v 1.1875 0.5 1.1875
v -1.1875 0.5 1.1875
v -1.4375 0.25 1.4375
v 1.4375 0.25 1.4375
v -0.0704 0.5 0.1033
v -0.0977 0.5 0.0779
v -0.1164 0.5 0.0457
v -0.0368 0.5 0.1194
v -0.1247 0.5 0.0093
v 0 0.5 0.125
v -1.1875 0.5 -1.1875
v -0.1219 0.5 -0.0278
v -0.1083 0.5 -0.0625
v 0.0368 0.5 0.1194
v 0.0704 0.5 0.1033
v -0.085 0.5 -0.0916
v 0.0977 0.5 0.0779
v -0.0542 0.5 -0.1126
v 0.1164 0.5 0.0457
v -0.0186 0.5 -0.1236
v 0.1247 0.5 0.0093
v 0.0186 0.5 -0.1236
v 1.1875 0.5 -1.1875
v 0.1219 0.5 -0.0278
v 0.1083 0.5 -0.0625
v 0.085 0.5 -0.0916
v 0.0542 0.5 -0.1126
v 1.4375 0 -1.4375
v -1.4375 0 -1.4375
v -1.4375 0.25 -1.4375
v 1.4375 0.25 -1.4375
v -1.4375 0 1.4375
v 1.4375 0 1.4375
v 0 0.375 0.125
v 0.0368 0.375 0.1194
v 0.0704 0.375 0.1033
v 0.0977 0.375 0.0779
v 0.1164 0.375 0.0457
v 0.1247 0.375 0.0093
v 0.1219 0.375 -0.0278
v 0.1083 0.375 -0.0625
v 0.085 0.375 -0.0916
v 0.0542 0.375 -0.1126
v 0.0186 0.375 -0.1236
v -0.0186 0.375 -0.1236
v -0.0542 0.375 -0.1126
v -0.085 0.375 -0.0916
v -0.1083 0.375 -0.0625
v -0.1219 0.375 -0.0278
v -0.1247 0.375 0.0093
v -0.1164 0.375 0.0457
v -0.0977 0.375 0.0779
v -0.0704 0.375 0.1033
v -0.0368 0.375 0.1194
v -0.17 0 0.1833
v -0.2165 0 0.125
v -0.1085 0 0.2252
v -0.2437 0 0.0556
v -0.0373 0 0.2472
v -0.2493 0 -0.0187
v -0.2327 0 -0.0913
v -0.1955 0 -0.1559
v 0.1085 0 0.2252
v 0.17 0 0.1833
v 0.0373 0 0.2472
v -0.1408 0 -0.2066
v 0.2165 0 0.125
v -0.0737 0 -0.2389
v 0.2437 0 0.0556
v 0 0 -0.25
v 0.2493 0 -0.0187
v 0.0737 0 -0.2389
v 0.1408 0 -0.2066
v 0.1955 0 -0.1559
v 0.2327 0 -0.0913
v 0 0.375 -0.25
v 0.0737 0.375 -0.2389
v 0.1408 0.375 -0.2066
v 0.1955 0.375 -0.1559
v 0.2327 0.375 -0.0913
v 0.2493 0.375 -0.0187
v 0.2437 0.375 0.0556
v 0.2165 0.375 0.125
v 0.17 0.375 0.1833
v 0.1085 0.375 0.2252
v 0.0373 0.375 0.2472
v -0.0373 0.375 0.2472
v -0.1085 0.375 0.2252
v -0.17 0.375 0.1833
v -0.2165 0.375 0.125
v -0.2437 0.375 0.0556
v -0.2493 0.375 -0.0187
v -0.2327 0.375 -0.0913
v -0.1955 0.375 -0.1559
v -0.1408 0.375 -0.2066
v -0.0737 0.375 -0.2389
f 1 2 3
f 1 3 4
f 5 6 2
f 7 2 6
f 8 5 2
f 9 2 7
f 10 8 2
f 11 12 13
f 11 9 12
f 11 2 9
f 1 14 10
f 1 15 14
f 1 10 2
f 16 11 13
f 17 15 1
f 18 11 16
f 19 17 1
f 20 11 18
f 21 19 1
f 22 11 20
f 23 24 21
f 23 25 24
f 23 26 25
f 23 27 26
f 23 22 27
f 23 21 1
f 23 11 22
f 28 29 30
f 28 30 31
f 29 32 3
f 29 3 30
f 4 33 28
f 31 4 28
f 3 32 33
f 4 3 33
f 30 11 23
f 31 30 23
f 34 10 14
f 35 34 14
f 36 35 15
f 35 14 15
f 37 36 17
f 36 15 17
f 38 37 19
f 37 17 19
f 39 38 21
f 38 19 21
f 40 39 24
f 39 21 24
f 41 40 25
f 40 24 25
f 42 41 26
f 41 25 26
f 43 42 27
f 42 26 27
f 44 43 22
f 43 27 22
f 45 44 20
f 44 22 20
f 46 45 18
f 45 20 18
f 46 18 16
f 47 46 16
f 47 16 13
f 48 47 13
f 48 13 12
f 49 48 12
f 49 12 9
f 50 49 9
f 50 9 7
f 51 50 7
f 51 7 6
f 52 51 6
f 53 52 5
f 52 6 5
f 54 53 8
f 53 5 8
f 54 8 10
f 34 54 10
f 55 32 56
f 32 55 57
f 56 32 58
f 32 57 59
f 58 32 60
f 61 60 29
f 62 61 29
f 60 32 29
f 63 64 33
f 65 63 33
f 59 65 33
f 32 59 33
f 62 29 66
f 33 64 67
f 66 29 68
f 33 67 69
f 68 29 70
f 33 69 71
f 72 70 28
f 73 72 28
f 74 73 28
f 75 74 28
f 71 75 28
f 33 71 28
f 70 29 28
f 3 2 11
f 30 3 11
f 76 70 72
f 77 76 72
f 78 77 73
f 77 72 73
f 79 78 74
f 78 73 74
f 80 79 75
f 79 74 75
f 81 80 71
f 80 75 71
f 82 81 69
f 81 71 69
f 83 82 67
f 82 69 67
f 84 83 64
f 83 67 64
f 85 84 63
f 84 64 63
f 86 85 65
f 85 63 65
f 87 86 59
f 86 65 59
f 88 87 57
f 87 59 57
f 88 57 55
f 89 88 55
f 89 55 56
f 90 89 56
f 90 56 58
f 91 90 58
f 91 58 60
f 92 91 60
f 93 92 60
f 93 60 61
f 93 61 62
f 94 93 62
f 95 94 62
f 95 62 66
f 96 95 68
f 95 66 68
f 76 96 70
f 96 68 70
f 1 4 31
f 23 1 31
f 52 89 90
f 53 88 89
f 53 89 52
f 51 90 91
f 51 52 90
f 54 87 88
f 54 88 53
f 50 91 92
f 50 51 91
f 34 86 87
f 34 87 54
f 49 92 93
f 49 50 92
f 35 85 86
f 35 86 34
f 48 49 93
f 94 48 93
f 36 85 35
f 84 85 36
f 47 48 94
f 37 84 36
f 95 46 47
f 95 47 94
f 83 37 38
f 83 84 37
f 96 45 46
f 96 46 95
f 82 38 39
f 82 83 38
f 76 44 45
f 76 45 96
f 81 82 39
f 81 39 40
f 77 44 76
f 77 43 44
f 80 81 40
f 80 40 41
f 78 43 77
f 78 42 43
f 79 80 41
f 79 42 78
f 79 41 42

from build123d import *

# Parameters (mm, degrees)
SKETCH1_W           = 2.875
SKETCH1_H           = 2.875
BOSS_EXTRUDE1_DEPTH = 0.5
SKETCH2_R           = 0.125
CUT_EXTRUDE1_DEPTH  = 0.125
SKETCH3_R           = 0.25
CUT_EXTRUDE2_DEPTH  = 0.375
CHAMFER2_SIZE       = 0.25


with BuildPart() as part:
    # Sketch1 → Boss-Extrude1 (new body)
    with BuildSketch(Plane(origin=(0, 0, 0), x_dir=(1, 0, 0), z_dir=(0, 1, 0))):
        Rectangle(SKETCH1_W, SKETCH1_H)
    extrude(amount=BOSS_EXTRUDE1_DEPTH)

    # Sketch2 → Cut-Extrude1 (cut)
    with BuildSketch(Plane(origin=(0, 0.5, 0), x_dir=(1, 0, 0), z_dir=(0, 1, 0))):
        with Locations(Location((0, 0, 0), (0, 0, 270))):
            Circle(SKETCH2_R)
    extrude(amount=-CUT_EXTRUDE1_DEPTH, mode=Mode.SUBTRACT)

    # Sketch3 → Cut-Extrude2 (cut)
    with BuildSketch(Plane.XZ):
        with Locations(Location((0, 0, 0), (0, 0, 270))):
            Circle(SKETCH3_R)
    extrude(amount=-CUT_EXTRUDE2_DEPTH, mode=Mode.SUBTRACT)

    # Chamfer2
    chamfer2_edges = [part.edges().sort_by_distance(p)[0] for p in [
        (-1.4375, 0.5, 0),
        (0, 0.5, 1.4375),
        (1.4375, 0.5, 0),
        (0, 0.5, -1.4375),
    ]]
    chamfer(chamfer2_edges, length=CHAMFER2_SIZE)


solid = part.part
